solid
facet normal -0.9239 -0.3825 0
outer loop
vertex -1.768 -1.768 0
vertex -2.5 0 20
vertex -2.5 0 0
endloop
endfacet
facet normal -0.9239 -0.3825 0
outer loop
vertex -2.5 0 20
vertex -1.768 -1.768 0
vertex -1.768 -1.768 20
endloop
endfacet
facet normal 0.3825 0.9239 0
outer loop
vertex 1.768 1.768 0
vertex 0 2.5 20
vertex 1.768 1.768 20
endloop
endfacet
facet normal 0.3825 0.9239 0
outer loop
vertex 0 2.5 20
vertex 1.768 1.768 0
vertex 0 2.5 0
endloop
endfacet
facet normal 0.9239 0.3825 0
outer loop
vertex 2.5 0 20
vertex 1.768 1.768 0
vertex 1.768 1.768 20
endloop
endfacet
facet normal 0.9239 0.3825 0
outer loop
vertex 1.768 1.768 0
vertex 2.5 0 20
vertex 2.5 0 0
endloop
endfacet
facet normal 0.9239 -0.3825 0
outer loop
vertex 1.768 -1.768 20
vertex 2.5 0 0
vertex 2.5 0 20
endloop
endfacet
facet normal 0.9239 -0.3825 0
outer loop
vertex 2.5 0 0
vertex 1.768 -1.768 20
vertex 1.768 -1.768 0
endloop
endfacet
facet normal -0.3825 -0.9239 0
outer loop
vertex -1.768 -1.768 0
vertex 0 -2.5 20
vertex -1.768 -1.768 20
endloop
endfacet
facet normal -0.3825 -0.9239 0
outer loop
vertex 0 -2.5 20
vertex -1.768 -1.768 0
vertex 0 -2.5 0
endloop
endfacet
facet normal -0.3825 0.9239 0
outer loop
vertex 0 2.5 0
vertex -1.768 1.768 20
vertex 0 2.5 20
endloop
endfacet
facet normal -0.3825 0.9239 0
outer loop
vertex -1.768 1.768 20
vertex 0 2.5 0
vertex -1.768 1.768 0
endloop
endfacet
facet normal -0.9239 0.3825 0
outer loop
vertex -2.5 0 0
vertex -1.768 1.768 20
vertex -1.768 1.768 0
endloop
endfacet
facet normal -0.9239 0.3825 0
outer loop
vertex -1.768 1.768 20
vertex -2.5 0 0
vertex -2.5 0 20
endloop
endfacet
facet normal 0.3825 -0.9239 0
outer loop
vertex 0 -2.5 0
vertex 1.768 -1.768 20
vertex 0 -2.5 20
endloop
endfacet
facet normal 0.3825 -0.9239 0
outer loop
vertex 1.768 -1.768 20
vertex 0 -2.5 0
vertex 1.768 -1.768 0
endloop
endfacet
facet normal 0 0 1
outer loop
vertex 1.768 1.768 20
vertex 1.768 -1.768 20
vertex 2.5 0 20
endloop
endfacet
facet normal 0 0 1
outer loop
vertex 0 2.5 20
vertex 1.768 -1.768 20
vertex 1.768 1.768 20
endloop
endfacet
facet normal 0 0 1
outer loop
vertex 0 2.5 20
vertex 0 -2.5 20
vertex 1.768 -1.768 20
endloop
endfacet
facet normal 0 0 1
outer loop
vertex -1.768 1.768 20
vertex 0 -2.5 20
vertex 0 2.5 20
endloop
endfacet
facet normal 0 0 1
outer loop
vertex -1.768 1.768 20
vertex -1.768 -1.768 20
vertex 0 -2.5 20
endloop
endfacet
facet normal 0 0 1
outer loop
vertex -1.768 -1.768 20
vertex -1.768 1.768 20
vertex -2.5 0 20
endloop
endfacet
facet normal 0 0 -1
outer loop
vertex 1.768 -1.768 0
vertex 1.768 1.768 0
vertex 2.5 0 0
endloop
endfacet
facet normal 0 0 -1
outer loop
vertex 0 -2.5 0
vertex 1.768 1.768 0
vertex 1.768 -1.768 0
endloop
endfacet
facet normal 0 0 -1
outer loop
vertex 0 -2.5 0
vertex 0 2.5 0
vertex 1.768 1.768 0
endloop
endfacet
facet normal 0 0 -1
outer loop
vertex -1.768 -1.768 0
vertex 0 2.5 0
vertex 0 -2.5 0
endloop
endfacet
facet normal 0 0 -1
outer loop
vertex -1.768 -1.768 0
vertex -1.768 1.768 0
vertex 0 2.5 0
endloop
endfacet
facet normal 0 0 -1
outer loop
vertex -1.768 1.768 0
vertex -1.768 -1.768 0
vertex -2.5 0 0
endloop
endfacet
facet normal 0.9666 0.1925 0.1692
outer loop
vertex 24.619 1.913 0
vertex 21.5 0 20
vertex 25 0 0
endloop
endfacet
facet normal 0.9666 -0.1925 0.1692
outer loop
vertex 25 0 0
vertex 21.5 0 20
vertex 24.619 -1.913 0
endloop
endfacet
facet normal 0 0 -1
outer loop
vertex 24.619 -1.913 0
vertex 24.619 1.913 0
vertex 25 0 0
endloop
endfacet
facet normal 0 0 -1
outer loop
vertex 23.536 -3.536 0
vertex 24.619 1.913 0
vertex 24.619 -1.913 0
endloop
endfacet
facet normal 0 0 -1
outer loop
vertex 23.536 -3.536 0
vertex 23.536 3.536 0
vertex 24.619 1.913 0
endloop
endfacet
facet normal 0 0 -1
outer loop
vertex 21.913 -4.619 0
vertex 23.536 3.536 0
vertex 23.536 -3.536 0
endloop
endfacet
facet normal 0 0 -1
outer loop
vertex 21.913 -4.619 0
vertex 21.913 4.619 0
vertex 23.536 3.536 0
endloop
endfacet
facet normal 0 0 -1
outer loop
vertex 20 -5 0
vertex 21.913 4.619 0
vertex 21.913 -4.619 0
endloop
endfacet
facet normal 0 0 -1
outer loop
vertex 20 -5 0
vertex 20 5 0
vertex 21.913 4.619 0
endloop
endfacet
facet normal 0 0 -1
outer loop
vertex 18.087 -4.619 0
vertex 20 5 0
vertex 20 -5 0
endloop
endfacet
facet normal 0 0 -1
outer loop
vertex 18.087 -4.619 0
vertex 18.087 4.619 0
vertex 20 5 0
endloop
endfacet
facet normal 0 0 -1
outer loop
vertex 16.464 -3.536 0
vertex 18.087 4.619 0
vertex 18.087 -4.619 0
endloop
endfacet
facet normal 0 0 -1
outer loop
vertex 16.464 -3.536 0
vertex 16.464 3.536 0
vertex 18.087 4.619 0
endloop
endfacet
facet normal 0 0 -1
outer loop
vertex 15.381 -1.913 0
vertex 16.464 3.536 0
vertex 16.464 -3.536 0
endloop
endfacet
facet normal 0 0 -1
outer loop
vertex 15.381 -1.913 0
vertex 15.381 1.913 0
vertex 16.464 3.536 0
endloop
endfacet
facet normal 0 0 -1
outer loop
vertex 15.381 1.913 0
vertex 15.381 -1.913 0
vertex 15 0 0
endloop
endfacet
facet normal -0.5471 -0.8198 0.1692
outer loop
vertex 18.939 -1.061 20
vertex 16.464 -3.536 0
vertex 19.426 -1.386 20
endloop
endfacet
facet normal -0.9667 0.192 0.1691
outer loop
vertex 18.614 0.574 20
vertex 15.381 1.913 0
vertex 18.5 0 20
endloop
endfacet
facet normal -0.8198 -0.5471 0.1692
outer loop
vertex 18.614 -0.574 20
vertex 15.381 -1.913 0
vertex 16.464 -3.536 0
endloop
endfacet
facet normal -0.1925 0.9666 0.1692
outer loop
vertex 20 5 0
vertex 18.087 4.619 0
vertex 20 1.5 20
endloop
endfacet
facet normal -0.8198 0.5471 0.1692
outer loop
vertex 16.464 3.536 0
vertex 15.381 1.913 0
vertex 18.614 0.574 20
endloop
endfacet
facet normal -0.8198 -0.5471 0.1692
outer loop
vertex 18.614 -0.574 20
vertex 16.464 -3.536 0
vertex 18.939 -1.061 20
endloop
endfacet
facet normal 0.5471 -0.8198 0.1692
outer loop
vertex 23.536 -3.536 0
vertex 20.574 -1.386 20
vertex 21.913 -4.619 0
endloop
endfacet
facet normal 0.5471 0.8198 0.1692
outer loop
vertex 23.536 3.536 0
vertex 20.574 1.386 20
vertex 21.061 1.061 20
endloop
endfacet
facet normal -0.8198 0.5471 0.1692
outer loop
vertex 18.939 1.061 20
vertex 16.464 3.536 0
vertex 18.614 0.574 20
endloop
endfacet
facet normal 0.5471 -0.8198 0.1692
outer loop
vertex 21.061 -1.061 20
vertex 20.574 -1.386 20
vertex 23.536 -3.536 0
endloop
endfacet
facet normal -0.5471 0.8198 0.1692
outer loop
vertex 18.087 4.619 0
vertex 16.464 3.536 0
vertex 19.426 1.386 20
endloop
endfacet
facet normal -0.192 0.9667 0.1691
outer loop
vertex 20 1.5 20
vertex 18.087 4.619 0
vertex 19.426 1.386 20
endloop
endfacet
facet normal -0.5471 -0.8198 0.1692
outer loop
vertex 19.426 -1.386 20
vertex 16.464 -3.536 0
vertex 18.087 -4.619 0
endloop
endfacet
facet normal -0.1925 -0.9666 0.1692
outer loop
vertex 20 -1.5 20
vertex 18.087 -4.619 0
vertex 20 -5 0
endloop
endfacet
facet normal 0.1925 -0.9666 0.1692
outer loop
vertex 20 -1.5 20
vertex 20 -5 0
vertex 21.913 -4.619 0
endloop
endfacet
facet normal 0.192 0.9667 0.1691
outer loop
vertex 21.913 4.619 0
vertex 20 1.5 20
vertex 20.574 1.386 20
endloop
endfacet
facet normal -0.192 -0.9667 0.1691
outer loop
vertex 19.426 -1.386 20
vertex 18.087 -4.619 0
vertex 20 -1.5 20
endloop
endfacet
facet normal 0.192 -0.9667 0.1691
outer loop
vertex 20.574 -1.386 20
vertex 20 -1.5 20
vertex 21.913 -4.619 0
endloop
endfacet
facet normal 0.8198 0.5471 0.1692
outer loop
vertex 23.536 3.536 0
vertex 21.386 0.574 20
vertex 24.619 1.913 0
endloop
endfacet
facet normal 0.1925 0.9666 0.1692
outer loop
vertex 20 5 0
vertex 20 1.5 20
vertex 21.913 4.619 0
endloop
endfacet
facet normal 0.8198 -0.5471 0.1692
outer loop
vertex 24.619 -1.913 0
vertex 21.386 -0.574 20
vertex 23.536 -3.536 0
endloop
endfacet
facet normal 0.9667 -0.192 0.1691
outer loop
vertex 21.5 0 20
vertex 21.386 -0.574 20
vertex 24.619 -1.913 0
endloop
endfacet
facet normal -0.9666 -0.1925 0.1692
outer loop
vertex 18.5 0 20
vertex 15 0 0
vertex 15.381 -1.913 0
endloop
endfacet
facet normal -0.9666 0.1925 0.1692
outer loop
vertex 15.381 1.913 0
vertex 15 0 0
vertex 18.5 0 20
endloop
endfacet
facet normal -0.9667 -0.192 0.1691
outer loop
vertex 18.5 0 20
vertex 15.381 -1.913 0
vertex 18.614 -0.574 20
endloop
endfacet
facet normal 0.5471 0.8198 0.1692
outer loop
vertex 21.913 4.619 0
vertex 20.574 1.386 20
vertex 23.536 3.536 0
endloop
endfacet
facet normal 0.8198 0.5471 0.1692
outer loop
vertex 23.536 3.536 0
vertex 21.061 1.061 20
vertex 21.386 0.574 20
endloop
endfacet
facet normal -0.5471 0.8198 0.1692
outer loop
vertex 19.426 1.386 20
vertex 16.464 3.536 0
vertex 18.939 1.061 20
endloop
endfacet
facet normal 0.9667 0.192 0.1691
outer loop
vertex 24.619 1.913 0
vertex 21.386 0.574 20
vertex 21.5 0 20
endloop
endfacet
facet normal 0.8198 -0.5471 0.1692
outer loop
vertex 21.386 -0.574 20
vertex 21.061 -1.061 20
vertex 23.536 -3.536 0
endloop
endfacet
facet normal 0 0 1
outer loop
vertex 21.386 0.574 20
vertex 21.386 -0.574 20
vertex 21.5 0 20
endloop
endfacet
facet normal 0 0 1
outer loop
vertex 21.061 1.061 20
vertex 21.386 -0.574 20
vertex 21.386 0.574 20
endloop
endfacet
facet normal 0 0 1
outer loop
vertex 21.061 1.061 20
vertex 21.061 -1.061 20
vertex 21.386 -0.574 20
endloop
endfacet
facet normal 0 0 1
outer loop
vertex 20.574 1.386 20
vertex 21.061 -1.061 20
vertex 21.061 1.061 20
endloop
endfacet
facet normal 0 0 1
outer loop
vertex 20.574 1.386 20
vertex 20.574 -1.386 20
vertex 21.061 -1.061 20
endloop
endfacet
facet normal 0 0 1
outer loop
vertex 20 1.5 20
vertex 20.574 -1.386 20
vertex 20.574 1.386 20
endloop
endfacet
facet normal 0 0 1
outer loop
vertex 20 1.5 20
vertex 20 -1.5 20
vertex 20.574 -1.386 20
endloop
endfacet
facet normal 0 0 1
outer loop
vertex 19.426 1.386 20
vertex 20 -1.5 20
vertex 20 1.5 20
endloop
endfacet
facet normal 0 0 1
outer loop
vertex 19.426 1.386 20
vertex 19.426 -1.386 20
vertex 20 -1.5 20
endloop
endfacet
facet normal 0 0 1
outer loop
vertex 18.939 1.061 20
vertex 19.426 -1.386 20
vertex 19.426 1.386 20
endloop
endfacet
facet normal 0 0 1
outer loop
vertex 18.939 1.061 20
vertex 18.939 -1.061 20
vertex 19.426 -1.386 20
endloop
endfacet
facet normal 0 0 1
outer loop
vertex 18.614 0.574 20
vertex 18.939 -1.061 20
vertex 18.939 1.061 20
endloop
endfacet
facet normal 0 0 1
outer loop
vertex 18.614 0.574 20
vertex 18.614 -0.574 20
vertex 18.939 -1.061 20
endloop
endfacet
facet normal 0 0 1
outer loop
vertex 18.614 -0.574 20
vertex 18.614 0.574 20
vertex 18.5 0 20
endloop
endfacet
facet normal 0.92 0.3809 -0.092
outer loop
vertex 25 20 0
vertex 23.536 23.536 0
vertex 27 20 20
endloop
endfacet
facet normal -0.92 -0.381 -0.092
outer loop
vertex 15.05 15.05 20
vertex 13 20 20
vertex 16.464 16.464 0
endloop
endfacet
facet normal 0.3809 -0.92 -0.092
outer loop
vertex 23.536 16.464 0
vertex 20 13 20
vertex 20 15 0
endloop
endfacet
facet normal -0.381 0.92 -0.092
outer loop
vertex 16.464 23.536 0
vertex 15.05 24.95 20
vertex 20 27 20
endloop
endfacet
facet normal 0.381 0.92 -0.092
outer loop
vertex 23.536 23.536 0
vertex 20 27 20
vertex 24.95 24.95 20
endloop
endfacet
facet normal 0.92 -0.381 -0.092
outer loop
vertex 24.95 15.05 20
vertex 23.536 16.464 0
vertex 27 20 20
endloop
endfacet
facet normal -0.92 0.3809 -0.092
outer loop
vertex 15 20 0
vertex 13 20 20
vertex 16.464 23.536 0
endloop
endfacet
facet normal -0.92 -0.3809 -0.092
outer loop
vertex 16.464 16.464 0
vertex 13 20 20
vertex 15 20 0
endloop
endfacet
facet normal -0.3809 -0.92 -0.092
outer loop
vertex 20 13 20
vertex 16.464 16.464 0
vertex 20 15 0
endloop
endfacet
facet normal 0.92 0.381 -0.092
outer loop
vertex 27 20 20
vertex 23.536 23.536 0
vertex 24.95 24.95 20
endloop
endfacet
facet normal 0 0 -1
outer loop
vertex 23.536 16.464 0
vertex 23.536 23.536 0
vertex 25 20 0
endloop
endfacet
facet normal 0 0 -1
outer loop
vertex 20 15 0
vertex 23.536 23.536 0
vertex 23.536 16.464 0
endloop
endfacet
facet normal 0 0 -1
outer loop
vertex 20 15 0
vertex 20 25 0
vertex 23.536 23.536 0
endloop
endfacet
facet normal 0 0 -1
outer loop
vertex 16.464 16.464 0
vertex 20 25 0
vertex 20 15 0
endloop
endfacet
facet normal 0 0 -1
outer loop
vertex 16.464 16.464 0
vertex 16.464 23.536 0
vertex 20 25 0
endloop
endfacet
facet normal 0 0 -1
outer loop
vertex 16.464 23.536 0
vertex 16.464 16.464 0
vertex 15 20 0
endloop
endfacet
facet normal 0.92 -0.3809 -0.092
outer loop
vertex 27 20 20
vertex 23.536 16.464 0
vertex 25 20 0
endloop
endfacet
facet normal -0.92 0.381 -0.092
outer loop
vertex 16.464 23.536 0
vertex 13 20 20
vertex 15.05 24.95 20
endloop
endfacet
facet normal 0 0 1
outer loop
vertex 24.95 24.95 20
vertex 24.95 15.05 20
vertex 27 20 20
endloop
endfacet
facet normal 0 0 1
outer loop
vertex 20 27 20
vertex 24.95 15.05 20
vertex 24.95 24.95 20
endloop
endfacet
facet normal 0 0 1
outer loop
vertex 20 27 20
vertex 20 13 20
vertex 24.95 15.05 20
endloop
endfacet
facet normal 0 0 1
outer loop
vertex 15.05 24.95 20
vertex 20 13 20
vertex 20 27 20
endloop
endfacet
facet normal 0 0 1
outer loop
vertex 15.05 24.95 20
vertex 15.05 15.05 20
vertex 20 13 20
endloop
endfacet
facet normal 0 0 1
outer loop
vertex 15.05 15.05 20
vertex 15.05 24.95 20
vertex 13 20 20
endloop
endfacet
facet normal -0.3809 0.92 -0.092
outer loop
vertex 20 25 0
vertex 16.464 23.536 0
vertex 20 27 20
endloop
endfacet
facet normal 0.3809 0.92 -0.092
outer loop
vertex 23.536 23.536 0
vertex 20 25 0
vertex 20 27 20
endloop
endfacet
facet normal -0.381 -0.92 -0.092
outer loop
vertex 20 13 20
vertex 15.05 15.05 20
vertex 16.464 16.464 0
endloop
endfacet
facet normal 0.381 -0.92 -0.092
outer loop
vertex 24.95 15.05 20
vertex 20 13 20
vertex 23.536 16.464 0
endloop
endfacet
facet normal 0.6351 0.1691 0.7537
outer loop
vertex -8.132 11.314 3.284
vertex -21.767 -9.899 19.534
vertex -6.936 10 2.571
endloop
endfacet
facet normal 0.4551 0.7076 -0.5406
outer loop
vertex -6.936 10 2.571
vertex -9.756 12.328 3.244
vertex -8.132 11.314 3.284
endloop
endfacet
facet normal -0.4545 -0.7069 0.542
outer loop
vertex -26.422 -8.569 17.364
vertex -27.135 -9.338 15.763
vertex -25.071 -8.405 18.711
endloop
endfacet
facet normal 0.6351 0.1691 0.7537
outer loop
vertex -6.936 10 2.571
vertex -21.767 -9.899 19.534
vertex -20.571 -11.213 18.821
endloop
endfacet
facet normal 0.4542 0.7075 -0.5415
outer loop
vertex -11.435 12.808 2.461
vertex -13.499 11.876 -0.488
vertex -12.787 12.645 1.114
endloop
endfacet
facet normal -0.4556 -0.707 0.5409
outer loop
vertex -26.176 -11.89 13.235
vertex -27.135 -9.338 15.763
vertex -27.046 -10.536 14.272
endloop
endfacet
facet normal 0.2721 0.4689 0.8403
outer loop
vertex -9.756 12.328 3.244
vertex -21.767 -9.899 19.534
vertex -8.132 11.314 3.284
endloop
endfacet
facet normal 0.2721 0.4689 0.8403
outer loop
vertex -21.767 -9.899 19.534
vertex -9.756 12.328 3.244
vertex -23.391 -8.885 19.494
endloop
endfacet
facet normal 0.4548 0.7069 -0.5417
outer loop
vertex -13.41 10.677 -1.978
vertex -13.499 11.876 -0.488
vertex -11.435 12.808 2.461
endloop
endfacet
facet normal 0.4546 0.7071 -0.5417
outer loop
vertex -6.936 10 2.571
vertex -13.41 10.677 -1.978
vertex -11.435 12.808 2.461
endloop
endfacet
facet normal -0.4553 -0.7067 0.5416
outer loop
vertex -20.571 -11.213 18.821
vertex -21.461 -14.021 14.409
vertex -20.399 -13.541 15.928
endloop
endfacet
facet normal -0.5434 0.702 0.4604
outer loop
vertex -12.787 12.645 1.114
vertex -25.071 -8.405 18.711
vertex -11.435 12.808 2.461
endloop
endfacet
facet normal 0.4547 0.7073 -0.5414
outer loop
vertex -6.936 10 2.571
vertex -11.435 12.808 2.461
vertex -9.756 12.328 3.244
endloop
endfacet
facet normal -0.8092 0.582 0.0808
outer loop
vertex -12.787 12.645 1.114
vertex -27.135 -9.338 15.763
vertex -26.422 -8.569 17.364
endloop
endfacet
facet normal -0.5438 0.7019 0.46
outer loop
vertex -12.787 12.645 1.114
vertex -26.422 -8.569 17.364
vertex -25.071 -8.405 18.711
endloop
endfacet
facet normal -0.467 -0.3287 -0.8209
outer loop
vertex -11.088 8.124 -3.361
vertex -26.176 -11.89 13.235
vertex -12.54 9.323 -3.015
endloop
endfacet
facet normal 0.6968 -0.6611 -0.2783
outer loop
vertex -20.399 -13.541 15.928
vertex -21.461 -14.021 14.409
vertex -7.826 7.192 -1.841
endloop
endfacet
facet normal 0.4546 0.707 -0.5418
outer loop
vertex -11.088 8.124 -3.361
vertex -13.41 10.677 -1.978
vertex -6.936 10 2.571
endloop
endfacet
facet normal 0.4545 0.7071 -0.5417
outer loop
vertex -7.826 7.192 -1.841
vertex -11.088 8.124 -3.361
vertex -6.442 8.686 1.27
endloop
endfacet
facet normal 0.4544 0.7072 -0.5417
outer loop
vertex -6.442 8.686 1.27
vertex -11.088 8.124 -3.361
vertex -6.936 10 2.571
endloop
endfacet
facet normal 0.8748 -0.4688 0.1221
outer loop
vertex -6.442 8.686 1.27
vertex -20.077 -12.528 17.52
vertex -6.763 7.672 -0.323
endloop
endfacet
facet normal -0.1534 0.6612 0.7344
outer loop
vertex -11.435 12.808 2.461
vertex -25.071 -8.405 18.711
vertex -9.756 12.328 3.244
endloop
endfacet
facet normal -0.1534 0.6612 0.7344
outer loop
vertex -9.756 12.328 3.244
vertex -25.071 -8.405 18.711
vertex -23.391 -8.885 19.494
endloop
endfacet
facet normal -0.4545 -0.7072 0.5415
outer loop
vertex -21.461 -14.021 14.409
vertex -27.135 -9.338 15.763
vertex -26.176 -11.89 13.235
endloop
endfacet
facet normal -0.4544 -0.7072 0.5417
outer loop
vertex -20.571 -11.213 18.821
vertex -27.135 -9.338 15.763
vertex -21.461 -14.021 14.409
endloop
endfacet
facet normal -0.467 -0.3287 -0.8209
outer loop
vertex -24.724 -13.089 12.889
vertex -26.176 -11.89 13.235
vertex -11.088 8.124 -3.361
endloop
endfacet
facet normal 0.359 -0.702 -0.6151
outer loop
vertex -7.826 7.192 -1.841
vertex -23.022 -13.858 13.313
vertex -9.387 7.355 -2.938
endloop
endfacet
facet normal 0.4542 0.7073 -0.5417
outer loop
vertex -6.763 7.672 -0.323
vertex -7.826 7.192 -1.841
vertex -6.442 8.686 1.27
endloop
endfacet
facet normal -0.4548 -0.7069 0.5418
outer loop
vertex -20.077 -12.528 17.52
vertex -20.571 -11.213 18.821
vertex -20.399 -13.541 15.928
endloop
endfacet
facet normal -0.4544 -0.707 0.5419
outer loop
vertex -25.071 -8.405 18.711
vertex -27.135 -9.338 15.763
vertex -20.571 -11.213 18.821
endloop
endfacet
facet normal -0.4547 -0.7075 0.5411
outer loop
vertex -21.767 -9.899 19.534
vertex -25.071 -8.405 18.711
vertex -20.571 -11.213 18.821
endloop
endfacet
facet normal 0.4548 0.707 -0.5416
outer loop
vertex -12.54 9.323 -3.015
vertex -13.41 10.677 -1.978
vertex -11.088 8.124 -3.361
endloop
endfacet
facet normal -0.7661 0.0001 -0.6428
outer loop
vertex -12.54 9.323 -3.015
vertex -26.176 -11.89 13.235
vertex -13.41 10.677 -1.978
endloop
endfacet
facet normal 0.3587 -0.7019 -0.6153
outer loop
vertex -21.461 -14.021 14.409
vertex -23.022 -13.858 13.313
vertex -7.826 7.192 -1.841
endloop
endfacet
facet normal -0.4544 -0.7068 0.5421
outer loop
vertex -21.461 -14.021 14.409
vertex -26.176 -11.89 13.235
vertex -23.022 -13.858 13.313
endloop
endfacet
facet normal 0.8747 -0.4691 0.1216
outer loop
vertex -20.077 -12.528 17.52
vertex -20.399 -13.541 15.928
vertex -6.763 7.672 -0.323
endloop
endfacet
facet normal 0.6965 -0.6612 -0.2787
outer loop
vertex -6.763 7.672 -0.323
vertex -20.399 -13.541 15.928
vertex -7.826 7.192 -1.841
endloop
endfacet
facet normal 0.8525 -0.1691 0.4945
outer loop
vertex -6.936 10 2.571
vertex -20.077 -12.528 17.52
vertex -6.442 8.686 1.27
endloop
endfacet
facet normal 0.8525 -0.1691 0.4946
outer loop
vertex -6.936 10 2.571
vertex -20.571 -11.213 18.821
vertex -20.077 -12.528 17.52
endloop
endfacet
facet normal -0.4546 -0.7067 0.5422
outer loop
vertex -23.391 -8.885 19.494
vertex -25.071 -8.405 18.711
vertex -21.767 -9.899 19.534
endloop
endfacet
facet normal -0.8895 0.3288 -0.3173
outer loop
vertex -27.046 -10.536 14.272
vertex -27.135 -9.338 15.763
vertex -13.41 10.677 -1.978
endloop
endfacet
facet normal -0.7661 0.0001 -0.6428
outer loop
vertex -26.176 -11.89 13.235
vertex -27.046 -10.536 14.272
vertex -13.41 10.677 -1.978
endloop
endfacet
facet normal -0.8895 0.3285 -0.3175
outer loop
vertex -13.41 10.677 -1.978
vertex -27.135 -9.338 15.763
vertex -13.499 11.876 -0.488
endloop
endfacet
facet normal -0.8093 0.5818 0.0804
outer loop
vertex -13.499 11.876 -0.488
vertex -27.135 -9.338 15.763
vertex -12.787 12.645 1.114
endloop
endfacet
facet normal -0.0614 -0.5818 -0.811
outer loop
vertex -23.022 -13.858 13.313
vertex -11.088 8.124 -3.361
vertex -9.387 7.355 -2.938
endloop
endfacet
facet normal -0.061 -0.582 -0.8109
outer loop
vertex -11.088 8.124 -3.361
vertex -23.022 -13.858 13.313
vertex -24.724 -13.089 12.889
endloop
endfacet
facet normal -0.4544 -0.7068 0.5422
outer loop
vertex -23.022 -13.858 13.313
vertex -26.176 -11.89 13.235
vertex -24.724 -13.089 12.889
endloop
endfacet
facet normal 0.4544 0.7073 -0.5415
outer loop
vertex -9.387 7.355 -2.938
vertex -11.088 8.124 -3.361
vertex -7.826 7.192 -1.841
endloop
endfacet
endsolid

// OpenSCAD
//Kommentarer med dobbel skråstrek
/*
Eller denne her / * * /som dere kjenner fra Arduino C++
*/

//Innebygde funskjoner er blant annet cylinder() med mange mulige argumenter
/*
cyilnder(h = height, d = diameter)
cylinder(h = height, r = radius)
cylinder(h = height, d1 = diameter_bottom, d2 = diameter_top)
cylinder(h = height, r1 = radius_bottom, r2 = radius_top)

Også: Legg til arguemntet $fn = N for å bruke en mange kant med N sider
Skikkelig kult å velge 3 eller 4 her
*/
//Cylinder with height 20 and diameter 5
cylinder(h = 20, d = 5);

//Kjegle med nedre diameter 10 og øvre diameter 3
//flyttes (translateres) maed kommandoen translate([x, y, z])
translate([20,0,0]) cylinder (h = 20, d1 = 10, d2 = 3);

//kjegle med nedre radius 5 og øvre radius 7, la det være en 8-kant
translate([20,20,0]) cylinder(h = 20, r1 = 5, r2 = 7, $fn=8);

//flyttet [0,20,0] rotasjon av sylinder 90 grader omkring x-aksen, 45 grader om y-aksen
translate([-10,10,0]) rotate([45,-40,0]) cylinder(h=30,r=4);
